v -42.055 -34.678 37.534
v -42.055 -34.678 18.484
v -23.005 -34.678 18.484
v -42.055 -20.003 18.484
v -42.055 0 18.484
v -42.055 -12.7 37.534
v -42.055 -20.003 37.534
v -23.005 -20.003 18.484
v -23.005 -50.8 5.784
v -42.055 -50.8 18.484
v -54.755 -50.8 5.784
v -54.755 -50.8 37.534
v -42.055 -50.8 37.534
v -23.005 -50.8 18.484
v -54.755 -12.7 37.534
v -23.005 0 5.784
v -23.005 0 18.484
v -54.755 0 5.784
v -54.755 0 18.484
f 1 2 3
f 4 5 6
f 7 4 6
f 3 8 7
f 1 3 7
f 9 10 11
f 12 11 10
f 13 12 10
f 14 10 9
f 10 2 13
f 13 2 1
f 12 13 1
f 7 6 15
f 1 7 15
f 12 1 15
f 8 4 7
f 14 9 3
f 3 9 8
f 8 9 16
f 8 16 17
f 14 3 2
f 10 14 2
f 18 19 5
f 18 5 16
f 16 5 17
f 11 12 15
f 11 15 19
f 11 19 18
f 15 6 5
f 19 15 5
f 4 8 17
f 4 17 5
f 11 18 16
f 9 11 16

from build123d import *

# Parameters (mm, degrees)
F1_DEPTH = 50.8
F3_DEPTH = 12.701
F4_W     = 19.05
F4_H     = 14.675198
F5_DEPTH = 19.05
F7_DEPTH = 30.798499


with BuildPart() as f1:
    # F0 (on Front) → F1 (new body)
    with BuildSketch(Plane.XZ):
        Polygon((-42.055184, 37.533606), (-54.755184, 37.533606), (-54.755184, 5.783606), (-23.005184, 5.783606), (-23.005184, 18.483606), (-42.055184, 18.483606), align=None)
    extrude(amount=F1_DEPTH)

    # F2 (on face) → F3 (cut, through all)
    with BuildSketch(Plane.YZ.offset(-42.055184)):
        Polygon((0, 37.533606), (-12.7, 37.533606), (0, 18.483606), align=None)
    extrude(amount=-F3_DEPTH, mode=Mode.SUBTRACT)

    # F4 (on face) → F5 (join)
    with BuildSketch(Plane.XY.offset(18.483606)):
        with Locations((-32.530184, -27.3401)):
            Rectangle(F4_W, F4_H)
    extrude(amount=F5_DEPTH)

    # F6 (on face) → F7 (cut, through all)
    with BuildSketch(Plane(origin=(0, -20.002501, 0), x_dir=(-1, 0, 0), z_dir=(0, 1, 0))):
        Polygon((23.005184, 18.483606), (42.055184, 37.533606), (23.005184, 37.533606), align=None)
    extrude(amount=-F7_DEPTH, mode=Mode.SUBTRACT)


solid = f1.part
